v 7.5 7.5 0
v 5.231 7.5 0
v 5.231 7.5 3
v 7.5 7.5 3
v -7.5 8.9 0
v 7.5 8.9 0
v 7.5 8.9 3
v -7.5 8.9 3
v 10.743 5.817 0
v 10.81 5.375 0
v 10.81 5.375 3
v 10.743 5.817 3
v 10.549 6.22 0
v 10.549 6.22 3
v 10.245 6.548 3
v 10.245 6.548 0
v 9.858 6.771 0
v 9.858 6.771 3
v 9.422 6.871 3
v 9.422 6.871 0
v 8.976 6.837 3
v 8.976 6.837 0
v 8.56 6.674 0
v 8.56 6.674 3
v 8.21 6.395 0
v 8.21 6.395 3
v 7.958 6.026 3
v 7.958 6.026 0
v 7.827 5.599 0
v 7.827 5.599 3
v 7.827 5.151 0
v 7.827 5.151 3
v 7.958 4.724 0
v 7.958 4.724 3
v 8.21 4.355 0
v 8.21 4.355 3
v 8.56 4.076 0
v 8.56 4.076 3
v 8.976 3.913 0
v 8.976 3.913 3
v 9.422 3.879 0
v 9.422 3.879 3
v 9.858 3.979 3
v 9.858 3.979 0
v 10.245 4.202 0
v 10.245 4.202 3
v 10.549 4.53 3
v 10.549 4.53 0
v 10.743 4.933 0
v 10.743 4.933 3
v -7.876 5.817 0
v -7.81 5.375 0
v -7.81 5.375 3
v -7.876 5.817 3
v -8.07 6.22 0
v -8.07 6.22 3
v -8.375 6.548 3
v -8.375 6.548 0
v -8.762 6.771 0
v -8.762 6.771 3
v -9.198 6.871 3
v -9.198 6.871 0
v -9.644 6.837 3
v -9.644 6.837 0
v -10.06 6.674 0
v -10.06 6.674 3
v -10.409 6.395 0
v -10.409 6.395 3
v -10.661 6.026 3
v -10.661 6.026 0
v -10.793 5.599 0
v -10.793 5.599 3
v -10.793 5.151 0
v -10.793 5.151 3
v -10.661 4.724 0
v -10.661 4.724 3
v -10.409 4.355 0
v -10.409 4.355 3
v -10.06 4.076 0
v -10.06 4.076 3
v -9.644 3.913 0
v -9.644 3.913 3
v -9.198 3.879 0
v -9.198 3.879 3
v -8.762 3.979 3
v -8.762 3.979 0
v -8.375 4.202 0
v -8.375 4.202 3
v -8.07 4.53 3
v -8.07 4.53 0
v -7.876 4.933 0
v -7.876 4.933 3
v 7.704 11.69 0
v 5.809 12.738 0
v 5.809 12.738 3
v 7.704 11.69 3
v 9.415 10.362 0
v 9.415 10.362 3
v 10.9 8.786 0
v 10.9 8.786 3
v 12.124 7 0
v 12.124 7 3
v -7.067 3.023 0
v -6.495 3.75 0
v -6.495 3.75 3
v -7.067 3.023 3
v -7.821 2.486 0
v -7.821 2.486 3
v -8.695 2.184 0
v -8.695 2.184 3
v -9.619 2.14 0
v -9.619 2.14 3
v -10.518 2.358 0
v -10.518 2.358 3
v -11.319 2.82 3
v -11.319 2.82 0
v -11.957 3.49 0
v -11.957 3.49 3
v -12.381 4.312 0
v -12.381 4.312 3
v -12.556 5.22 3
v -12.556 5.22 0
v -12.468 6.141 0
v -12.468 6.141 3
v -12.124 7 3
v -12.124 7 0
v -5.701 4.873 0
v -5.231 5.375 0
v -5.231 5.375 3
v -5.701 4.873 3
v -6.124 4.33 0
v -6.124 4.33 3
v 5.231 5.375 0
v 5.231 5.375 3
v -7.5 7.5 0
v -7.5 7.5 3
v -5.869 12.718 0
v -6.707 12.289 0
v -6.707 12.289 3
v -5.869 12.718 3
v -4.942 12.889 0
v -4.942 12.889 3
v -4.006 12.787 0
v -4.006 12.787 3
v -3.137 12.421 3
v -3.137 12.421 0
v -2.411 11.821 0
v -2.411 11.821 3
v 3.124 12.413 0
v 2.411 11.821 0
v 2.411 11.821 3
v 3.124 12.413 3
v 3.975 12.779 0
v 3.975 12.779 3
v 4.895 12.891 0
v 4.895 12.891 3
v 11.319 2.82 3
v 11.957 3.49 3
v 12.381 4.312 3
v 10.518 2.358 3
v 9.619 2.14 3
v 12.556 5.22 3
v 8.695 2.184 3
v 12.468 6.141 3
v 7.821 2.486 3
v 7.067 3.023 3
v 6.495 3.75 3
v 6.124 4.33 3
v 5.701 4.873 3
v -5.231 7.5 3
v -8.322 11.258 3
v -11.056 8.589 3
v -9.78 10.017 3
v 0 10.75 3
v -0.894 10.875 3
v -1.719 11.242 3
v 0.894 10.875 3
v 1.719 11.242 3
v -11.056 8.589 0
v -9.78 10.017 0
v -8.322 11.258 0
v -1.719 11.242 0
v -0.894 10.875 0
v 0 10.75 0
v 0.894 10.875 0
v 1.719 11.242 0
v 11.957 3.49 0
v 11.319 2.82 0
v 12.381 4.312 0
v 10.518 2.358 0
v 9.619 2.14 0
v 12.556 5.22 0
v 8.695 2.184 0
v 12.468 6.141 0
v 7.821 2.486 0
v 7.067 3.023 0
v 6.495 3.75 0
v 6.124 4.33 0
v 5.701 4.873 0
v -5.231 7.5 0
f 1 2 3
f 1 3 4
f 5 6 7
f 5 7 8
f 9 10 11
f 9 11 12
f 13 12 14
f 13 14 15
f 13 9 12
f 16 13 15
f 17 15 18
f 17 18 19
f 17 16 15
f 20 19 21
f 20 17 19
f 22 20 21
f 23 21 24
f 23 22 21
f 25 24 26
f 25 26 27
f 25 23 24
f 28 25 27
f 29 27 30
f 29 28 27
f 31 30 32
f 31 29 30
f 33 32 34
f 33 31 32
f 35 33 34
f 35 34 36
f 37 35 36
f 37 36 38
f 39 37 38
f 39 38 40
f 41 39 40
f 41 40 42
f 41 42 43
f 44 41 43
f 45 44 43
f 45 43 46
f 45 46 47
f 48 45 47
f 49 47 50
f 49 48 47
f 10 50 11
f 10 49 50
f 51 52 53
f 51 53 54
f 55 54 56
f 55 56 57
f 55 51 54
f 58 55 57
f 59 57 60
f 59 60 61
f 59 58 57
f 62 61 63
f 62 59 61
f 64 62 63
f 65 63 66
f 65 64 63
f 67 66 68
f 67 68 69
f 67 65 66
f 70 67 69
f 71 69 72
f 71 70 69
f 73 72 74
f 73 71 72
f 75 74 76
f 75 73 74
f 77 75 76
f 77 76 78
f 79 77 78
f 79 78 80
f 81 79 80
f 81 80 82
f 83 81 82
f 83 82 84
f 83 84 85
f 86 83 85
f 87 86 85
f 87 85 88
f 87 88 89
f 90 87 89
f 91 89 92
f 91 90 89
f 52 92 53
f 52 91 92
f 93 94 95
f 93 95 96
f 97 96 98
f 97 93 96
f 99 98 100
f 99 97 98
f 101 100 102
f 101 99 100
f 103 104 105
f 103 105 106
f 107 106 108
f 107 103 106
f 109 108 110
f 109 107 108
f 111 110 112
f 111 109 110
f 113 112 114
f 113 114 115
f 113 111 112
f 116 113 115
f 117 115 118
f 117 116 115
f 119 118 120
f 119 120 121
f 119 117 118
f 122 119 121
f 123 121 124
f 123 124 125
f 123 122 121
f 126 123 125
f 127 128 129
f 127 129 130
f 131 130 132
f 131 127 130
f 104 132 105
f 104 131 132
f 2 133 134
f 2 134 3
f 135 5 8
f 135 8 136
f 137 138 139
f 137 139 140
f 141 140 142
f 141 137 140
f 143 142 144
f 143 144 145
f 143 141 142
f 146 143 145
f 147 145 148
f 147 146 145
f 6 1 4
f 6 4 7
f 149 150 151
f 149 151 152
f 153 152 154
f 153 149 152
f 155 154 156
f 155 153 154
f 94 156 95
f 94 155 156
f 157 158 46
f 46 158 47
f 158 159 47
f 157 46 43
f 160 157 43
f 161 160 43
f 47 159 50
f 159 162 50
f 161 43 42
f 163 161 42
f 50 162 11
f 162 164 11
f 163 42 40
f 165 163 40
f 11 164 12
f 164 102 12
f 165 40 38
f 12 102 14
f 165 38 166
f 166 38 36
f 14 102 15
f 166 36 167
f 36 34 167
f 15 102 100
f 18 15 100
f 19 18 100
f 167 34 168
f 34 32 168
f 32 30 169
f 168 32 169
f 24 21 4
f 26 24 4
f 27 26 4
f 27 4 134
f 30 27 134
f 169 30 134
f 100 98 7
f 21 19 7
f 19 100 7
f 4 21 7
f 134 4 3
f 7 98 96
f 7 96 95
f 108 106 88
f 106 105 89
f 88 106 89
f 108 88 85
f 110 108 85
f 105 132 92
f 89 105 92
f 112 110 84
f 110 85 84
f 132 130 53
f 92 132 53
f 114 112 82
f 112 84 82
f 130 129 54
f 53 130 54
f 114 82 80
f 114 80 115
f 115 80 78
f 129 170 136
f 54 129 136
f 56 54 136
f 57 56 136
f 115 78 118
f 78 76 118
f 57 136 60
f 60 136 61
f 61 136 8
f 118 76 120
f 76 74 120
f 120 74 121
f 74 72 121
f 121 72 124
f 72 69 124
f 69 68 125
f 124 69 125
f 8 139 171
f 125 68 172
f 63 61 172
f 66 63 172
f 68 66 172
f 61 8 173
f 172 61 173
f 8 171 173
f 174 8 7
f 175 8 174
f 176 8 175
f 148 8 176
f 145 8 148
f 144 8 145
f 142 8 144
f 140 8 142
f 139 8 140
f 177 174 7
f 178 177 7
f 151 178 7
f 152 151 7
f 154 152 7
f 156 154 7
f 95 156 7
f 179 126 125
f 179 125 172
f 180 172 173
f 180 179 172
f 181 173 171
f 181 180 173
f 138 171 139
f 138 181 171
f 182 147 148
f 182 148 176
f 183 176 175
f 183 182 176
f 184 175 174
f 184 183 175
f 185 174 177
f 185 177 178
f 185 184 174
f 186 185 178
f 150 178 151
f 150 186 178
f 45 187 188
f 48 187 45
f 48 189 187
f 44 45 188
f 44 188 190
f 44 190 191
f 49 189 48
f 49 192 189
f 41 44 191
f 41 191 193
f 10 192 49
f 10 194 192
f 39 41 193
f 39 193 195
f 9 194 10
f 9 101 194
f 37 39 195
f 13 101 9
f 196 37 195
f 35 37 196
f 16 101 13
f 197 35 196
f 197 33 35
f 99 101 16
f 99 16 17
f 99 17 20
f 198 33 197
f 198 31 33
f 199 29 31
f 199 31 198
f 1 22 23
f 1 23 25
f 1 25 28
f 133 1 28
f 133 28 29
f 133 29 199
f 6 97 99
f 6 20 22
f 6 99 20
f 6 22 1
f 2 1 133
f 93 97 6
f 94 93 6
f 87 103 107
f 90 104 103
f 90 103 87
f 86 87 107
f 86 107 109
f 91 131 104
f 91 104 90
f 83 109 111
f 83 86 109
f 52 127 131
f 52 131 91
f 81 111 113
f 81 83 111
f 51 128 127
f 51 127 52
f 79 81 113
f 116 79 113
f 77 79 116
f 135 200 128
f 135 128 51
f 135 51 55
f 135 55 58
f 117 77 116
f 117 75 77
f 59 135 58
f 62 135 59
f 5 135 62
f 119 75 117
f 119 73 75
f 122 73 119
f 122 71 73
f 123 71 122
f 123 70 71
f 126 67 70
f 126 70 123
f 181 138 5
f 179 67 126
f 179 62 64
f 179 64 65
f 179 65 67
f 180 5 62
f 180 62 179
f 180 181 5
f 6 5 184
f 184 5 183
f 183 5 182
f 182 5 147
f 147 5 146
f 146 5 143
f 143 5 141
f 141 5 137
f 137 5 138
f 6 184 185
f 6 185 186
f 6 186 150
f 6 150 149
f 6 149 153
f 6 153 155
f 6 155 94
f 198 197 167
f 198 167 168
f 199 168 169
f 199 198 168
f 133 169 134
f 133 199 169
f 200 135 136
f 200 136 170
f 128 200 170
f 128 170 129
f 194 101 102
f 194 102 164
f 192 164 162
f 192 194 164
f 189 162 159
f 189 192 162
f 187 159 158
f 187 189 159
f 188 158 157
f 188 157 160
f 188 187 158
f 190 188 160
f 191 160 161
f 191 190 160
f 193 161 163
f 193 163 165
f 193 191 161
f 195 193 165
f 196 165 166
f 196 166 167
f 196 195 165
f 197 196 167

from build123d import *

# Parameters (mm, degrees)
ESQUISSE1_R        = 1.5
BOSS_EXTRU_2_DEPTH = 3


with BuildPart() as part:
    # Esquisse1 → Boss.-Extru.2 (new body)
    with BuildSketch(Plane.XY):
        with BuildLine():
            Line((5.230618988, 7.5), (7.5, 7.5))
            Line((7.5, 7.5), (7.5, 8.9))
            Line((7.5, 8.9), (-7.5, 8.9))
            Line((-7.5, 8.9), (-7.5, 7.5))
            Line((-7.5, 7.5), (-5.230618988, 7.5))
            Line((-5.230618988, 7.5), (-5.230618988, 5.375))
            ThreePointArc((-5.230618988, 5.375), (-5.918936429, 4.606103727), (-6.495190528, 3.75))
            ThreePointArc((-6.495190528, 3.75), (-10.934773091, 2.560417438), (-12.124355653, 7))
            ThreePointArc((-12.124355653, 7), (-9.780131311, 10.017436376), (-6.707371512, 12.288660114))
            ThreePointArc((-6.707371512, 12.288660114), (-4.47014813, 12.872261577), (-2.411034891, 11.820685714))
            ThreePointArc((-2.411034891, 11.820685714), (0, 10.75), (2.411034891, 11.820685714))
            ThreePointArc((2.411034891, 11.820685714), (3.975330286, 12.779130538), (5.80943088, 12.737759334))
            ThreePointArc((5.80943088, 12.737759334), (9.414650572, 10.36167721), (12.124355653, 7))
            ThreePointArc((12.124355653, 7), (10.934773091, 2.560417438), (6.495190528, 3.75))
            ThreePointArc((6.495190528, 3.75), (5.918936429, 4.606103727), (5.230618988, 5.375))
            Line((5.230618988, 5.375), (5.230618988, 7.5))
        make_face()
        with Locations((9.309773091, 5.375)):
            Circle(ESQUISSE1_R, mode=Mode.SUBTRACT)
        with Locations((-9.309773091, 5.375)):
            Circle(ESQUISSE1_R, mode=Mode.SUBTRACT)
    extrude(amount=BOSS_EXTRU_2_DEPTH)


solid = part.part
